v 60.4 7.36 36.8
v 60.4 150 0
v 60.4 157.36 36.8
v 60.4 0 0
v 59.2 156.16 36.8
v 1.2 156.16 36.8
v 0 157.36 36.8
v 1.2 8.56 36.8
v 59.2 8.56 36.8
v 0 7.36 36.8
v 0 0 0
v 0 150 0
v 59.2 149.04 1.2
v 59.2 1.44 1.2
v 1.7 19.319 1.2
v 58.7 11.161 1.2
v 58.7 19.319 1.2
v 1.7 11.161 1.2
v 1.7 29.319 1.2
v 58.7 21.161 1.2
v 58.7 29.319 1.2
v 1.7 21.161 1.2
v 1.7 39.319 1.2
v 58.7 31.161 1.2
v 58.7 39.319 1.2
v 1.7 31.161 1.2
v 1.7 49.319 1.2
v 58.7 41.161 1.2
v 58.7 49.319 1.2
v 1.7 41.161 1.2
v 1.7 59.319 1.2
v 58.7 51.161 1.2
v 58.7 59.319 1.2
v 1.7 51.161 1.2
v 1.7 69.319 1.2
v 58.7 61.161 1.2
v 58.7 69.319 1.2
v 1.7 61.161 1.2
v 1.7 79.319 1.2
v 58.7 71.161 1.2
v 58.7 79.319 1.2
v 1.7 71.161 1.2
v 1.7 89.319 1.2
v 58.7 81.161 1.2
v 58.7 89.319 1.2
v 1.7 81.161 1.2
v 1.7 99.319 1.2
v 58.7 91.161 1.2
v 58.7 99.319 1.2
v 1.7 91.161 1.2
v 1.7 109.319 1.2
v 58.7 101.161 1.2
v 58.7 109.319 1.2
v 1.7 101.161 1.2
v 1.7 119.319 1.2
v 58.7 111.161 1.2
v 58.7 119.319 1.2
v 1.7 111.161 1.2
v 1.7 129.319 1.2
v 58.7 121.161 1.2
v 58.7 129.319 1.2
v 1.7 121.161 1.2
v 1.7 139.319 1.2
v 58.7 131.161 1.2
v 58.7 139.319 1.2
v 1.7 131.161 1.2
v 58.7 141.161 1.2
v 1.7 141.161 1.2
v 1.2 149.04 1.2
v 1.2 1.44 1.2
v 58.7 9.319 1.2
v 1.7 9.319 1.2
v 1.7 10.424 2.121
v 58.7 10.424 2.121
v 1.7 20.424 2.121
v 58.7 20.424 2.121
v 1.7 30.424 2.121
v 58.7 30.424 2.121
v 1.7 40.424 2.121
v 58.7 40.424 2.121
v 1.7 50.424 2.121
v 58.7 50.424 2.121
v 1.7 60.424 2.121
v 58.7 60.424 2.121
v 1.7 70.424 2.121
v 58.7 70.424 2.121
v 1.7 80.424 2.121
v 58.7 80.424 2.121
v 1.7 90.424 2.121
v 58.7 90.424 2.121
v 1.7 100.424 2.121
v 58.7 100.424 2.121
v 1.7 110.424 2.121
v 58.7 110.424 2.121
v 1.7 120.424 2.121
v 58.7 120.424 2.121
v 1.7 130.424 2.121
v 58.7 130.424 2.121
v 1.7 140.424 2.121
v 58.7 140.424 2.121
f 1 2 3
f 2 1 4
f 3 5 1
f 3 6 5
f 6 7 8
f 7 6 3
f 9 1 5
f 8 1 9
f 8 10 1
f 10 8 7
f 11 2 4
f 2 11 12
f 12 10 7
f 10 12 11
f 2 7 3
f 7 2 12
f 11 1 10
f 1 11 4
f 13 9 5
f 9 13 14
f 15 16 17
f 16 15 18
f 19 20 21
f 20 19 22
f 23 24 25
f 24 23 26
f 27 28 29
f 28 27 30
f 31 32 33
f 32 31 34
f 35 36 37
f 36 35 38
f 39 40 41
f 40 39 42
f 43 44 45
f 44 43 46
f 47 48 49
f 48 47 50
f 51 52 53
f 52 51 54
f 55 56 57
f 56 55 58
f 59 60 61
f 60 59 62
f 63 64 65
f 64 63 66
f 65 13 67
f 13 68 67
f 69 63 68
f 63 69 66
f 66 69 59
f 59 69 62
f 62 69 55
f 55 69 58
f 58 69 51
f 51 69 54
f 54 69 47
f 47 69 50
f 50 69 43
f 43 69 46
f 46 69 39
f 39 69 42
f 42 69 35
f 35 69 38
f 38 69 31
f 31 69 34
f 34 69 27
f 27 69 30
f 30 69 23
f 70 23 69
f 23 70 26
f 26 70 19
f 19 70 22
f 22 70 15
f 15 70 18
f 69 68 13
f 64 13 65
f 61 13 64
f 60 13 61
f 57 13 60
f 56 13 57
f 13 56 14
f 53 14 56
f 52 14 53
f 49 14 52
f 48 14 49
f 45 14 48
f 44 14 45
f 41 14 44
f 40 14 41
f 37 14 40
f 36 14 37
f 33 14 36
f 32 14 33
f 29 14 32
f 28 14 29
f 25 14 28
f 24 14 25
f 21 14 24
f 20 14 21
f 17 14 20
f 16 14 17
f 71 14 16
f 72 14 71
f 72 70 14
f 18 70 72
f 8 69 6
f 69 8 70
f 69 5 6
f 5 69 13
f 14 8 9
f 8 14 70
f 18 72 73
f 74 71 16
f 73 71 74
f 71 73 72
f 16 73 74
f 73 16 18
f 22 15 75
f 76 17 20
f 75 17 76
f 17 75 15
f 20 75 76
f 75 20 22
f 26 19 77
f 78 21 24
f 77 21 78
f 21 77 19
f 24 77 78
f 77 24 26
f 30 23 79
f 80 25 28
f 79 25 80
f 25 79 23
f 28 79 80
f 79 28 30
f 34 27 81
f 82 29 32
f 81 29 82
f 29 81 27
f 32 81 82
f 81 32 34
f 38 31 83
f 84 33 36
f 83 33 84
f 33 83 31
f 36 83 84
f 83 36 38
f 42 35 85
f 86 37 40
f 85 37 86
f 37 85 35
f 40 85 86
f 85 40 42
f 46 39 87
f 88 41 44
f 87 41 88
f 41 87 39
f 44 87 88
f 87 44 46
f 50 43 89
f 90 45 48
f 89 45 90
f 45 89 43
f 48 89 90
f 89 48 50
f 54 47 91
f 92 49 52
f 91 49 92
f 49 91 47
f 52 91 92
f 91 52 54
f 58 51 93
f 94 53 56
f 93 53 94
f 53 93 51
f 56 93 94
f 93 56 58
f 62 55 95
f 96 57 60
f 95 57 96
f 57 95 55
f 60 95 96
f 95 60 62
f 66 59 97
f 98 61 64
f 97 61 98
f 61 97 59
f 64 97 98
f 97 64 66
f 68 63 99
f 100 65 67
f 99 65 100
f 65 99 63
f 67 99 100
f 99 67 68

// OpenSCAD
// Boxes to hold #1 coin envelopes.
// I use these for storing and organizing small electronic components.
//
// 2022-08-24 Adrian McCarthy

module envelope_box(envelope_w, envelope_h, wall_th=1.2, clearance=1) {
    box_w = wall_th + envelope_w + clearance + wall_th;
    box_h = wall_th + 0.4*envelope_h;
    box_d = 150;  // fits Sterilite 6-quart shoebox
    multmatrix([[1, 0, 0, 0],
                [0, 1, 0.2, 0],
                [0, 0, 1, 0]]) {
        difference() {
            cube([box_w, box_d, box_h]);
            translate([wall_th, wall_th, wall_th])
                cube([envelope_w + clearance, box_d - 2*wall_th, box_h]);
        }
        
        // Little ridges in the floor of the box help envelopes
        // stand upright when the box is less than full.
        dy = 10;
        ridge = 1.25*wall_th;
        translate([wall_th + clearance/2, 0, 0]) {
            for (y = [dy:dy:box_d - dy]) {
                translate([0, y, 0]) rotate([45, 0, 0])
                    cube([envelope_w, ridge, ridge]);
            }
        }
    }
}

module divider(envelope_w, envelope_h, label_h=25.4/2, th=1.2, nozzle_d=0.4) {
    r = 3;
    dx = envelope_w/2 - r;
    dy = envelope_h/2 - r;
    extra = label_h + 2*r;
    $fs = nozzle_d/2;
    difference() {
        linear_extrude(th) {
            difference() {
                hull() {
                    translate([-dx, -dy]) circle(r=r);
                    translate([ dx, -dy]) circle(r=r);
                    translate([-dx,  dy + extra]) circle(r=r);
                    translate([ dx,  dy + extra]) circle(r=r);
                }
                hull() {
                    translate([        0,  dy - 2*r]) circle(r=r);
                    translate([-dx + 2*r,     extra]) circle(r=r);
                    translate([ dx - 2*r,    -extra]) circle(r=r);
                    translate([        0, -dy + 2*r]) circle(r=r);
                }
            }
        }
        translate([-dx, dy+2*r, max(th/2, th-nozzle_d)]) {
            cube([2*dx, label_h, th]);
        }
    }
}

module coin_envelope_box() {
    envelope_box(57, 89, wall_th=1.2, clearance=1);
}

module coin_envelope_divider(nozzle_d=0.4) {
    divider(57, 89, nozzle_d=nozzle_d);
}

coin_envelope_box();
//coin_envelope_divider();
